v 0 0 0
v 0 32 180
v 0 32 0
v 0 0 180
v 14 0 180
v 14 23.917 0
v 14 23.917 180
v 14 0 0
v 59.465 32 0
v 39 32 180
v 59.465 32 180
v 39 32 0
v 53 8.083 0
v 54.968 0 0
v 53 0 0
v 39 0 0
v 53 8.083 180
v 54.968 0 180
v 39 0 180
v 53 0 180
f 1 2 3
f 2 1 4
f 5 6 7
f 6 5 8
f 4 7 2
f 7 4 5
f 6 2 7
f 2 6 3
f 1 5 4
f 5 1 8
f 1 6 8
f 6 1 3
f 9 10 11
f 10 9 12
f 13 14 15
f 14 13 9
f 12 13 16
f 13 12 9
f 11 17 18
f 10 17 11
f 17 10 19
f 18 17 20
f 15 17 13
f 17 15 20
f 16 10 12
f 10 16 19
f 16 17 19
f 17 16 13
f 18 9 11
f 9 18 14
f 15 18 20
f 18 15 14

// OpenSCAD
part = "pair"; // "pair", "wall", "panel"
length = 180;
height = 32;
thickness = 14;
bevel_deg = 30;
tilt_deg = 8;
slot_length = 10;
slot_width = 4.5;

bevel_drop = tan(bevel_deg) * thickness;
tilt_rise = tan(tilt_deg) * height;

module screw_slot(x) {
  hull() {
    translate([x - slot_length / 2, height * 0.45, thickness / 2])
      rotate([90, 0, 0])
      cylinder(h = 3, d = slot_width, $fn = 20);
    translate([x + slot_length / 2, height * 0.45, thickness / 2])
      rotate([90, 0, 0])
      cylinder(h = 3, d = slot_width, $fn = 20);
  }
}

module wall_half() {
  difference() {
    linear_extrude(height = length)
      polygon([
        [0, 0],
        [thickness, 0],
        [thickness, height - bevel_drop],
        [0, height]
      ]);

    rotate([0, 0, 90]) {
      translate([length * 0.25, -2, thickness / 2])
        screw_slot(length * 0.0);
      translate([length * 0.75, -2, thickness / 2])
        screw_slot(length * 0.0);
    }
  }
}

module panel_half() {
  union() {
    linear_extrude(height = length)
      polygon([
        [0, 0],
        [thickness, bevel_drop],
        [thickness, height],
        [0, height]
      ]);

    translate([thickness, 0, 0])
      linear_extrude(height = length)
      polygon([
        [0, 0],
        [tan(tilt_deg) * thickness, 0],
        [tan(tilt_deg) * thickness + tilt_rise, height],
        [0, height]
      ]);
  }
}

if (part == "wall") {
  wall_half();
} else if (part == "panel") {
  panel_half();
} else {
  wall_half();
  translate([thickness + 25, 0, 0])
    panel_half();
}
